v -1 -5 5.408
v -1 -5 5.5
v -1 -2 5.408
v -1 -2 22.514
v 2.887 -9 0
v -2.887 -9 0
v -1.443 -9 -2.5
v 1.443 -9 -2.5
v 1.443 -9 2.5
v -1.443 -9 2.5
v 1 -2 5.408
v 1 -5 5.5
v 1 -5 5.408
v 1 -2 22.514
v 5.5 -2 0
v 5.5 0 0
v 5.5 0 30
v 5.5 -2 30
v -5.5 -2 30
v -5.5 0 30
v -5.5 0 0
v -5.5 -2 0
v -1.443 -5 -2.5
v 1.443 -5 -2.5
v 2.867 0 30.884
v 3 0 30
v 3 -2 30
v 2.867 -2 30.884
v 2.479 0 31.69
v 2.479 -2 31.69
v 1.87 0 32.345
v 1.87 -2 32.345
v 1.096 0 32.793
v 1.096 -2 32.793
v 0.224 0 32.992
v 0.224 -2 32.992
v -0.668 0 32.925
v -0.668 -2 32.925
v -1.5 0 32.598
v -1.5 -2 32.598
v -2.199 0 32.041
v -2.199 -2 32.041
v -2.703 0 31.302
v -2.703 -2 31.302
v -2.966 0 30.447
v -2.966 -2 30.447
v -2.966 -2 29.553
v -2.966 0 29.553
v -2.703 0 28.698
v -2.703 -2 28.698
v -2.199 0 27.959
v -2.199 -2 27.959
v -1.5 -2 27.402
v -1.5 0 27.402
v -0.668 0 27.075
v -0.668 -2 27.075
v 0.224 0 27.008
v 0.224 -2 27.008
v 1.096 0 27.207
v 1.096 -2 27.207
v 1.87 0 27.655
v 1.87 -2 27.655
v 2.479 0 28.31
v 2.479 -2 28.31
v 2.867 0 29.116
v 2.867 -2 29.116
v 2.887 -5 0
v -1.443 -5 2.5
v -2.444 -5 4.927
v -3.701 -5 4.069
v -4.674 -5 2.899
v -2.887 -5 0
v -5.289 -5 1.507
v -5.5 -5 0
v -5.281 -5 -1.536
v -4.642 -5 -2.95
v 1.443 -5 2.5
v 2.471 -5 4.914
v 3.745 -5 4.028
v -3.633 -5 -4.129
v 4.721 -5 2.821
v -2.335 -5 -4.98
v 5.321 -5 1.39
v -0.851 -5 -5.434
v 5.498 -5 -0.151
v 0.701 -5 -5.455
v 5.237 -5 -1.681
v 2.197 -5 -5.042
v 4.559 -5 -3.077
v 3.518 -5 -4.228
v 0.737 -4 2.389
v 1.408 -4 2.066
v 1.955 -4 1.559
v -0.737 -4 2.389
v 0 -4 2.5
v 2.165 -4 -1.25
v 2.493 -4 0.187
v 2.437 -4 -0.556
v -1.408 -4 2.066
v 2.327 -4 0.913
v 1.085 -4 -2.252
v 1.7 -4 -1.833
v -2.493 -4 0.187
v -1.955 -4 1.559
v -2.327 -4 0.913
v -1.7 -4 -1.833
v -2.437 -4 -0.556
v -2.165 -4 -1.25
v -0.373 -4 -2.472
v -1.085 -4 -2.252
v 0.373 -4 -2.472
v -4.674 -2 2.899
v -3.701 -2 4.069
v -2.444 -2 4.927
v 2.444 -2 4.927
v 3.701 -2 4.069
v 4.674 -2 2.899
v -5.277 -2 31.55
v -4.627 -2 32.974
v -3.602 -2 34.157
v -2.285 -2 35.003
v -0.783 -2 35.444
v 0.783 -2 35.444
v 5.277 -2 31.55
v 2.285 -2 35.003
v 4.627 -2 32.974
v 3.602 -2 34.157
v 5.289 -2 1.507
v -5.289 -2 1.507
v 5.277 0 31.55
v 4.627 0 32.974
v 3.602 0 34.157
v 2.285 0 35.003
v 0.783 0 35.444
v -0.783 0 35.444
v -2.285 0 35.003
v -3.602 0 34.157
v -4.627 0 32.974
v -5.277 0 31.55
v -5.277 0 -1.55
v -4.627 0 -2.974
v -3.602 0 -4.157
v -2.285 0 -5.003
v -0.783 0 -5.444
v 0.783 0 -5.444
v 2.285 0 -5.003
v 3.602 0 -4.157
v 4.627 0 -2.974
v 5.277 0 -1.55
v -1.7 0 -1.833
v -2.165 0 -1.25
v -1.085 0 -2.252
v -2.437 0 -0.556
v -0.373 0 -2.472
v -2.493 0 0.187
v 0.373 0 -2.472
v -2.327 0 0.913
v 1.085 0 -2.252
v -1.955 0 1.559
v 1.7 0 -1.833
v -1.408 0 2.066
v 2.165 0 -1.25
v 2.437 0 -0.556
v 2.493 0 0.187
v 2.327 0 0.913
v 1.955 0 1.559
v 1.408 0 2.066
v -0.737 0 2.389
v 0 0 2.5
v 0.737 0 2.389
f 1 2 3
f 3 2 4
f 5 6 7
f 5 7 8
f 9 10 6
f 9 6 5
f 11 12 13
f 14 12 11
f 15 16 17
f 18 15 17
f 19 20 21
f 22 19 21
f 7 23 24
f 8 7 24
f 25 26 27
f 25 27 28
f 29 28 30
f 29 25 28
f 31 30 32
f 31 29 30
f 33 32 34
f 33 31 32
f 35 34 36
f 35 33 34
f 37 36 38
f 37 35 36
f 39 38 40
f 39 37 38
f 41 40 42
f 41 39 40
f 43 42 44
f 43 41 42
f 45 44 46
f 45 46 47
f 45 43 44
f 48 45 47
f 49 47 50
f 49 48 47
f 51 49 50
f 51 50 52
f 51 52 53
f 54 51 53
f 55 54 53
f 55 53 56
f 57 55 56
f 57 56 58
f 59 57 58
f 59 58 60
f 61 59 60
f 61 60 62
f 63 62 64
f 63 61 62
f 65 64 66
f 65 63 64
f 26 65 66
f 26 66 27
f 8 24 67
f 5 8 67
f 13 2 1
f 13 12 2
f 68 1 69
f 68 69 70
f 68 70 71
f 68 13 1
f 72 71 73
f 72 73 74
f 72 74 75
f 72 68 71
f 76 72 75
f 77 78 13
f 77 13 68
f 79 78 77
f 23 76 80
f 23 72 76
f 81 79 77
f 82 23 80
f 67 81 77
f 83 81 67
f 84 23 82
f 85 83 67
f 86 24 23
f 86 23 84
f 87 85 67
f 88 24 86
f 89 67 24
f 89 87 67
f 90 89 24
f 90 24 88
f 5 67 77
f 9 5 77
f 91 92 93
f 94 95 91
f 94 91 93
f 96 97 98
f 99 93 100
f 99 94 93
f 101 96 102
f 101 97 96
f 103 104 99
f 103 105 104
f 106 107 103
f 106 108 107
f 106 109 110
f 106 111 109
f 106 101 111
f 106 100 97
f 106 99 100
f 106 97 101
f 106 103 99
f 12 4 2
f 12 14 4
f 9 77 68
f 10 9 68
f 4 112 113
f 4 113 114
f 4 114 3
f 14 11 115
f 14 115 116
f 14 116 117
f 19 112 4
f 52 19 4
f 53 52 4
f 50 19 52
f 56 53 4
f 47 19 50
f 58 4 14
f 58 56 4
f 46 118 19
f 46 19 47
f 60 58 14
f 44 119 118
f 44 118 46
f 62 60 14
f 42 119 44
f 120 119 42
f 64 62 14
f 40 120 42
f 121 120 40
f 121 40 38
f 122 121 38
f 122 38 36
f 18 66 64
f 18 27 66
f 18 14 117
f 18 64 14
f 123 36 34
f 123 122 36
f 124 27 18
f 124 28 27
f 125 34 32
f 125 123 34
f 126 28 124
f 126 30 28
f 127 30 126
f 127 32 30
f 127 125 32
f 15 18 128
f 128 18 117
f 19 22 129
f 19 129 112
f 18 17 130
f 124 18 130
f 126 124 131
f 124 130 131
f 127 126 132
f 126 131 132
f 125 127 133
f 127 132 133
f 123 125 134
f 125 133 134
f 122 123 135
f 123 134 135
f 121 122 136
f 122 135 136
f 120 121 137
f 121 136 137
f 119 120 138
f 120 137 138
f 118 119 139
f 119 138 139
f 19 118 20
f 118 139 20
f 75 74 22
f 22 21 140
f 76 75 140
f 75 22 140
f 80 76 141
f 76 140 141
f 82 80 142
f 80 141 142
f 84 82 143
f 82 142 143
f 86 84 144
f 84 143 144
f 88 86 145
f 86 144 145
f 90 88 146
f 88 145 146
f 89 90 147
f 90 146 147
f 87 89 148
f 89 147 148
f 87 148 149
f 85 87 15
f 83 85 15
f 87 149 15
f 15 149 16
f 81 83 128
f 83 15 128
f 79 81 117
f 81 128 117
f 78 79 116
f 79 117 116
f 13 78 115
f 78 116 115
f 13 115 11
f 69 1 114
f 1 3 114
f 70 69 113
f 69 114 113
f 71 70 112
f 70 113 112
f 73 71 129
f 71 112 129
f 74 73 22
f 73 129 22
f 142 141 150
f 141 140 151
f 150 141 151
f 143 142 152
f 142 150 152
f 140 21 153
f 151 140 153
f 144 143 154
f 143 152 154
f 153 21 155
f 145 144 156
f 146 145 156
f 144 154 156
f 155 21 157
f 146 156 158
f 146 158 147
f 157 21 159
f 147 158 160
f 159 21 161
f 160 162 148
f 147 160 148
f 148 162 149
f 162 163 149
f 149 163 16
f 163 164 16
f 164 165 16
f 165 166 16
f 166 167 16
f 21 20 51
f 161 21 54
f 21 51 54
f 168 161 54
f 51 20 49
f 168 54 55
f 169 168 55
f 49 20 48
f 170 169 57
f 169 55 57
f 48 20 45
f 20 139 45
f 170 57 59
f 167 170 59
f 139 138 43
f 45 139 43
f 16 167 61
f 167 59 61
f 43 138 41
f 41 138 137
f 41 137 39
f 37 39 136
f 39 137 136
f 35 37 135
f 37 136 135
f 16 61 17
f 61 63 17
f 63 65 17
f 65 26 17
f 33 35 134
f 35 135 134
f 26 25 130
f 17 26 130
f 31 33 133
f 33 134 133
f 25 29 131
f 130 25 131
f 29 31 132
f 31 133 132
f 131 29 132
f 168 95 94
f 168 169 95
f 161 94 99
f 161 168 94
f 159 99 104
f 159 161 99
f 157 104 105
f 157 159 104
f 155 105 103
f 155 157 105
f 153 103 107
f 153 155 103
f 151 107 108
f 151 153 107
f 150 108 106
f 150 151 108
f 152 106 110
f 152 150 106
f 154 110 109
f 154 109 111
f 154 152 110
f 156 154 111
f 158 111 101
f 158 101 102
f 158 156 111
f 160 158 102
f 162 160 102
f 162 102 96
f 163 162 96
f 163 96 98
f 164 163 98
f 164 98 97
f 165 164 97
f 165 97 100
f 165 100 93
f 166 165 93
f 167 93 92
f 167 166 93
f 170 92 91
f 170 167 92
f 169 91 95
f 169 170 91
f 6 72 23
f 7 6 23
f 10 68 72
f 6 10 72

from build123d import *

# Parameters (mm, degrees)
F0_R     = 3
F1_DEPTH = 2
F2_DEPTH = 5
F3_DEPTH = 9
F5_DEPTH = 1
F6_W     = 4
F6_H     = 2.5


with BuildPart() as f1:
    # F0 (on Front) → F1 (new body)
    with BuildSketch(Plane.XZ):
        with BuildLine():
            ThreePointArc((5.5, 30), (0, 35.5), (-5.5, 30))
            Line((-5.5, 30), (-5.5, 0))
            ThreePointArc((-5.5, 0), (0, 5.5), (5.5, 0))
            Line((5.5, 0), (5.5, 30))
        make_face()
        with Locations((0, 30)):
            Circle(F0_R, mode=Mode.SUBTRACT)
    extrude(amount=F1_DEPTH)

    # F0 (on Front) → F2 (join)
    with BuildSketch(Plane.XZ):
        with BuildLine():
            ThreePointArc((5.5, 0), (0, 5.5), (-5.5, 0))
            ThreePointArc((-5.5, 0), (0, -5.5), (5.5, 0))
        make_face()
        Polygon((-2.886751, 0), (-1.443376, 2.5), (1.443376, 2.5), (2.886751, 0), (1.443376, -2.5), (-1.443376, -2.5), align=None, mode=Mode.SUBTRACT)
    extrude(amount=F2_DEPTH)

    # F0 (on Front) → F3 (join)
    with BuildSketch(Plane.XZ):
        Polygon((1.443376, 2.5), (-1.443376, 2.5), (-2.886751, 0), (-1.443376, -2.5), (1.443376, -2.5), (2.886751, 0), align=None)
    extrude(amount=F3_DEPTH)

    # F4 (on Right) → F5 (join, symmetric)
    with BuildSketch(Plane.YZ):
        Polygon((-5, 5.5), (-5, 3.5), (-2, 3.5), (-2, 5.5), (-2, 22.513845), align=None)
    extrude(amount=F5_DEPTH, both=True)

    # F6 (on Right) → F7 (revolve, cut)
    with BuildSketch(Plane.YZ):
        with Locations((-2, 1.25)):
            Rectangle(F6_W, F6_H)
    revolve(axis=Axis((0, -2, 0), (0, -1, 0)), mode=Mode.SUBTRACT)


solid = f1.part
